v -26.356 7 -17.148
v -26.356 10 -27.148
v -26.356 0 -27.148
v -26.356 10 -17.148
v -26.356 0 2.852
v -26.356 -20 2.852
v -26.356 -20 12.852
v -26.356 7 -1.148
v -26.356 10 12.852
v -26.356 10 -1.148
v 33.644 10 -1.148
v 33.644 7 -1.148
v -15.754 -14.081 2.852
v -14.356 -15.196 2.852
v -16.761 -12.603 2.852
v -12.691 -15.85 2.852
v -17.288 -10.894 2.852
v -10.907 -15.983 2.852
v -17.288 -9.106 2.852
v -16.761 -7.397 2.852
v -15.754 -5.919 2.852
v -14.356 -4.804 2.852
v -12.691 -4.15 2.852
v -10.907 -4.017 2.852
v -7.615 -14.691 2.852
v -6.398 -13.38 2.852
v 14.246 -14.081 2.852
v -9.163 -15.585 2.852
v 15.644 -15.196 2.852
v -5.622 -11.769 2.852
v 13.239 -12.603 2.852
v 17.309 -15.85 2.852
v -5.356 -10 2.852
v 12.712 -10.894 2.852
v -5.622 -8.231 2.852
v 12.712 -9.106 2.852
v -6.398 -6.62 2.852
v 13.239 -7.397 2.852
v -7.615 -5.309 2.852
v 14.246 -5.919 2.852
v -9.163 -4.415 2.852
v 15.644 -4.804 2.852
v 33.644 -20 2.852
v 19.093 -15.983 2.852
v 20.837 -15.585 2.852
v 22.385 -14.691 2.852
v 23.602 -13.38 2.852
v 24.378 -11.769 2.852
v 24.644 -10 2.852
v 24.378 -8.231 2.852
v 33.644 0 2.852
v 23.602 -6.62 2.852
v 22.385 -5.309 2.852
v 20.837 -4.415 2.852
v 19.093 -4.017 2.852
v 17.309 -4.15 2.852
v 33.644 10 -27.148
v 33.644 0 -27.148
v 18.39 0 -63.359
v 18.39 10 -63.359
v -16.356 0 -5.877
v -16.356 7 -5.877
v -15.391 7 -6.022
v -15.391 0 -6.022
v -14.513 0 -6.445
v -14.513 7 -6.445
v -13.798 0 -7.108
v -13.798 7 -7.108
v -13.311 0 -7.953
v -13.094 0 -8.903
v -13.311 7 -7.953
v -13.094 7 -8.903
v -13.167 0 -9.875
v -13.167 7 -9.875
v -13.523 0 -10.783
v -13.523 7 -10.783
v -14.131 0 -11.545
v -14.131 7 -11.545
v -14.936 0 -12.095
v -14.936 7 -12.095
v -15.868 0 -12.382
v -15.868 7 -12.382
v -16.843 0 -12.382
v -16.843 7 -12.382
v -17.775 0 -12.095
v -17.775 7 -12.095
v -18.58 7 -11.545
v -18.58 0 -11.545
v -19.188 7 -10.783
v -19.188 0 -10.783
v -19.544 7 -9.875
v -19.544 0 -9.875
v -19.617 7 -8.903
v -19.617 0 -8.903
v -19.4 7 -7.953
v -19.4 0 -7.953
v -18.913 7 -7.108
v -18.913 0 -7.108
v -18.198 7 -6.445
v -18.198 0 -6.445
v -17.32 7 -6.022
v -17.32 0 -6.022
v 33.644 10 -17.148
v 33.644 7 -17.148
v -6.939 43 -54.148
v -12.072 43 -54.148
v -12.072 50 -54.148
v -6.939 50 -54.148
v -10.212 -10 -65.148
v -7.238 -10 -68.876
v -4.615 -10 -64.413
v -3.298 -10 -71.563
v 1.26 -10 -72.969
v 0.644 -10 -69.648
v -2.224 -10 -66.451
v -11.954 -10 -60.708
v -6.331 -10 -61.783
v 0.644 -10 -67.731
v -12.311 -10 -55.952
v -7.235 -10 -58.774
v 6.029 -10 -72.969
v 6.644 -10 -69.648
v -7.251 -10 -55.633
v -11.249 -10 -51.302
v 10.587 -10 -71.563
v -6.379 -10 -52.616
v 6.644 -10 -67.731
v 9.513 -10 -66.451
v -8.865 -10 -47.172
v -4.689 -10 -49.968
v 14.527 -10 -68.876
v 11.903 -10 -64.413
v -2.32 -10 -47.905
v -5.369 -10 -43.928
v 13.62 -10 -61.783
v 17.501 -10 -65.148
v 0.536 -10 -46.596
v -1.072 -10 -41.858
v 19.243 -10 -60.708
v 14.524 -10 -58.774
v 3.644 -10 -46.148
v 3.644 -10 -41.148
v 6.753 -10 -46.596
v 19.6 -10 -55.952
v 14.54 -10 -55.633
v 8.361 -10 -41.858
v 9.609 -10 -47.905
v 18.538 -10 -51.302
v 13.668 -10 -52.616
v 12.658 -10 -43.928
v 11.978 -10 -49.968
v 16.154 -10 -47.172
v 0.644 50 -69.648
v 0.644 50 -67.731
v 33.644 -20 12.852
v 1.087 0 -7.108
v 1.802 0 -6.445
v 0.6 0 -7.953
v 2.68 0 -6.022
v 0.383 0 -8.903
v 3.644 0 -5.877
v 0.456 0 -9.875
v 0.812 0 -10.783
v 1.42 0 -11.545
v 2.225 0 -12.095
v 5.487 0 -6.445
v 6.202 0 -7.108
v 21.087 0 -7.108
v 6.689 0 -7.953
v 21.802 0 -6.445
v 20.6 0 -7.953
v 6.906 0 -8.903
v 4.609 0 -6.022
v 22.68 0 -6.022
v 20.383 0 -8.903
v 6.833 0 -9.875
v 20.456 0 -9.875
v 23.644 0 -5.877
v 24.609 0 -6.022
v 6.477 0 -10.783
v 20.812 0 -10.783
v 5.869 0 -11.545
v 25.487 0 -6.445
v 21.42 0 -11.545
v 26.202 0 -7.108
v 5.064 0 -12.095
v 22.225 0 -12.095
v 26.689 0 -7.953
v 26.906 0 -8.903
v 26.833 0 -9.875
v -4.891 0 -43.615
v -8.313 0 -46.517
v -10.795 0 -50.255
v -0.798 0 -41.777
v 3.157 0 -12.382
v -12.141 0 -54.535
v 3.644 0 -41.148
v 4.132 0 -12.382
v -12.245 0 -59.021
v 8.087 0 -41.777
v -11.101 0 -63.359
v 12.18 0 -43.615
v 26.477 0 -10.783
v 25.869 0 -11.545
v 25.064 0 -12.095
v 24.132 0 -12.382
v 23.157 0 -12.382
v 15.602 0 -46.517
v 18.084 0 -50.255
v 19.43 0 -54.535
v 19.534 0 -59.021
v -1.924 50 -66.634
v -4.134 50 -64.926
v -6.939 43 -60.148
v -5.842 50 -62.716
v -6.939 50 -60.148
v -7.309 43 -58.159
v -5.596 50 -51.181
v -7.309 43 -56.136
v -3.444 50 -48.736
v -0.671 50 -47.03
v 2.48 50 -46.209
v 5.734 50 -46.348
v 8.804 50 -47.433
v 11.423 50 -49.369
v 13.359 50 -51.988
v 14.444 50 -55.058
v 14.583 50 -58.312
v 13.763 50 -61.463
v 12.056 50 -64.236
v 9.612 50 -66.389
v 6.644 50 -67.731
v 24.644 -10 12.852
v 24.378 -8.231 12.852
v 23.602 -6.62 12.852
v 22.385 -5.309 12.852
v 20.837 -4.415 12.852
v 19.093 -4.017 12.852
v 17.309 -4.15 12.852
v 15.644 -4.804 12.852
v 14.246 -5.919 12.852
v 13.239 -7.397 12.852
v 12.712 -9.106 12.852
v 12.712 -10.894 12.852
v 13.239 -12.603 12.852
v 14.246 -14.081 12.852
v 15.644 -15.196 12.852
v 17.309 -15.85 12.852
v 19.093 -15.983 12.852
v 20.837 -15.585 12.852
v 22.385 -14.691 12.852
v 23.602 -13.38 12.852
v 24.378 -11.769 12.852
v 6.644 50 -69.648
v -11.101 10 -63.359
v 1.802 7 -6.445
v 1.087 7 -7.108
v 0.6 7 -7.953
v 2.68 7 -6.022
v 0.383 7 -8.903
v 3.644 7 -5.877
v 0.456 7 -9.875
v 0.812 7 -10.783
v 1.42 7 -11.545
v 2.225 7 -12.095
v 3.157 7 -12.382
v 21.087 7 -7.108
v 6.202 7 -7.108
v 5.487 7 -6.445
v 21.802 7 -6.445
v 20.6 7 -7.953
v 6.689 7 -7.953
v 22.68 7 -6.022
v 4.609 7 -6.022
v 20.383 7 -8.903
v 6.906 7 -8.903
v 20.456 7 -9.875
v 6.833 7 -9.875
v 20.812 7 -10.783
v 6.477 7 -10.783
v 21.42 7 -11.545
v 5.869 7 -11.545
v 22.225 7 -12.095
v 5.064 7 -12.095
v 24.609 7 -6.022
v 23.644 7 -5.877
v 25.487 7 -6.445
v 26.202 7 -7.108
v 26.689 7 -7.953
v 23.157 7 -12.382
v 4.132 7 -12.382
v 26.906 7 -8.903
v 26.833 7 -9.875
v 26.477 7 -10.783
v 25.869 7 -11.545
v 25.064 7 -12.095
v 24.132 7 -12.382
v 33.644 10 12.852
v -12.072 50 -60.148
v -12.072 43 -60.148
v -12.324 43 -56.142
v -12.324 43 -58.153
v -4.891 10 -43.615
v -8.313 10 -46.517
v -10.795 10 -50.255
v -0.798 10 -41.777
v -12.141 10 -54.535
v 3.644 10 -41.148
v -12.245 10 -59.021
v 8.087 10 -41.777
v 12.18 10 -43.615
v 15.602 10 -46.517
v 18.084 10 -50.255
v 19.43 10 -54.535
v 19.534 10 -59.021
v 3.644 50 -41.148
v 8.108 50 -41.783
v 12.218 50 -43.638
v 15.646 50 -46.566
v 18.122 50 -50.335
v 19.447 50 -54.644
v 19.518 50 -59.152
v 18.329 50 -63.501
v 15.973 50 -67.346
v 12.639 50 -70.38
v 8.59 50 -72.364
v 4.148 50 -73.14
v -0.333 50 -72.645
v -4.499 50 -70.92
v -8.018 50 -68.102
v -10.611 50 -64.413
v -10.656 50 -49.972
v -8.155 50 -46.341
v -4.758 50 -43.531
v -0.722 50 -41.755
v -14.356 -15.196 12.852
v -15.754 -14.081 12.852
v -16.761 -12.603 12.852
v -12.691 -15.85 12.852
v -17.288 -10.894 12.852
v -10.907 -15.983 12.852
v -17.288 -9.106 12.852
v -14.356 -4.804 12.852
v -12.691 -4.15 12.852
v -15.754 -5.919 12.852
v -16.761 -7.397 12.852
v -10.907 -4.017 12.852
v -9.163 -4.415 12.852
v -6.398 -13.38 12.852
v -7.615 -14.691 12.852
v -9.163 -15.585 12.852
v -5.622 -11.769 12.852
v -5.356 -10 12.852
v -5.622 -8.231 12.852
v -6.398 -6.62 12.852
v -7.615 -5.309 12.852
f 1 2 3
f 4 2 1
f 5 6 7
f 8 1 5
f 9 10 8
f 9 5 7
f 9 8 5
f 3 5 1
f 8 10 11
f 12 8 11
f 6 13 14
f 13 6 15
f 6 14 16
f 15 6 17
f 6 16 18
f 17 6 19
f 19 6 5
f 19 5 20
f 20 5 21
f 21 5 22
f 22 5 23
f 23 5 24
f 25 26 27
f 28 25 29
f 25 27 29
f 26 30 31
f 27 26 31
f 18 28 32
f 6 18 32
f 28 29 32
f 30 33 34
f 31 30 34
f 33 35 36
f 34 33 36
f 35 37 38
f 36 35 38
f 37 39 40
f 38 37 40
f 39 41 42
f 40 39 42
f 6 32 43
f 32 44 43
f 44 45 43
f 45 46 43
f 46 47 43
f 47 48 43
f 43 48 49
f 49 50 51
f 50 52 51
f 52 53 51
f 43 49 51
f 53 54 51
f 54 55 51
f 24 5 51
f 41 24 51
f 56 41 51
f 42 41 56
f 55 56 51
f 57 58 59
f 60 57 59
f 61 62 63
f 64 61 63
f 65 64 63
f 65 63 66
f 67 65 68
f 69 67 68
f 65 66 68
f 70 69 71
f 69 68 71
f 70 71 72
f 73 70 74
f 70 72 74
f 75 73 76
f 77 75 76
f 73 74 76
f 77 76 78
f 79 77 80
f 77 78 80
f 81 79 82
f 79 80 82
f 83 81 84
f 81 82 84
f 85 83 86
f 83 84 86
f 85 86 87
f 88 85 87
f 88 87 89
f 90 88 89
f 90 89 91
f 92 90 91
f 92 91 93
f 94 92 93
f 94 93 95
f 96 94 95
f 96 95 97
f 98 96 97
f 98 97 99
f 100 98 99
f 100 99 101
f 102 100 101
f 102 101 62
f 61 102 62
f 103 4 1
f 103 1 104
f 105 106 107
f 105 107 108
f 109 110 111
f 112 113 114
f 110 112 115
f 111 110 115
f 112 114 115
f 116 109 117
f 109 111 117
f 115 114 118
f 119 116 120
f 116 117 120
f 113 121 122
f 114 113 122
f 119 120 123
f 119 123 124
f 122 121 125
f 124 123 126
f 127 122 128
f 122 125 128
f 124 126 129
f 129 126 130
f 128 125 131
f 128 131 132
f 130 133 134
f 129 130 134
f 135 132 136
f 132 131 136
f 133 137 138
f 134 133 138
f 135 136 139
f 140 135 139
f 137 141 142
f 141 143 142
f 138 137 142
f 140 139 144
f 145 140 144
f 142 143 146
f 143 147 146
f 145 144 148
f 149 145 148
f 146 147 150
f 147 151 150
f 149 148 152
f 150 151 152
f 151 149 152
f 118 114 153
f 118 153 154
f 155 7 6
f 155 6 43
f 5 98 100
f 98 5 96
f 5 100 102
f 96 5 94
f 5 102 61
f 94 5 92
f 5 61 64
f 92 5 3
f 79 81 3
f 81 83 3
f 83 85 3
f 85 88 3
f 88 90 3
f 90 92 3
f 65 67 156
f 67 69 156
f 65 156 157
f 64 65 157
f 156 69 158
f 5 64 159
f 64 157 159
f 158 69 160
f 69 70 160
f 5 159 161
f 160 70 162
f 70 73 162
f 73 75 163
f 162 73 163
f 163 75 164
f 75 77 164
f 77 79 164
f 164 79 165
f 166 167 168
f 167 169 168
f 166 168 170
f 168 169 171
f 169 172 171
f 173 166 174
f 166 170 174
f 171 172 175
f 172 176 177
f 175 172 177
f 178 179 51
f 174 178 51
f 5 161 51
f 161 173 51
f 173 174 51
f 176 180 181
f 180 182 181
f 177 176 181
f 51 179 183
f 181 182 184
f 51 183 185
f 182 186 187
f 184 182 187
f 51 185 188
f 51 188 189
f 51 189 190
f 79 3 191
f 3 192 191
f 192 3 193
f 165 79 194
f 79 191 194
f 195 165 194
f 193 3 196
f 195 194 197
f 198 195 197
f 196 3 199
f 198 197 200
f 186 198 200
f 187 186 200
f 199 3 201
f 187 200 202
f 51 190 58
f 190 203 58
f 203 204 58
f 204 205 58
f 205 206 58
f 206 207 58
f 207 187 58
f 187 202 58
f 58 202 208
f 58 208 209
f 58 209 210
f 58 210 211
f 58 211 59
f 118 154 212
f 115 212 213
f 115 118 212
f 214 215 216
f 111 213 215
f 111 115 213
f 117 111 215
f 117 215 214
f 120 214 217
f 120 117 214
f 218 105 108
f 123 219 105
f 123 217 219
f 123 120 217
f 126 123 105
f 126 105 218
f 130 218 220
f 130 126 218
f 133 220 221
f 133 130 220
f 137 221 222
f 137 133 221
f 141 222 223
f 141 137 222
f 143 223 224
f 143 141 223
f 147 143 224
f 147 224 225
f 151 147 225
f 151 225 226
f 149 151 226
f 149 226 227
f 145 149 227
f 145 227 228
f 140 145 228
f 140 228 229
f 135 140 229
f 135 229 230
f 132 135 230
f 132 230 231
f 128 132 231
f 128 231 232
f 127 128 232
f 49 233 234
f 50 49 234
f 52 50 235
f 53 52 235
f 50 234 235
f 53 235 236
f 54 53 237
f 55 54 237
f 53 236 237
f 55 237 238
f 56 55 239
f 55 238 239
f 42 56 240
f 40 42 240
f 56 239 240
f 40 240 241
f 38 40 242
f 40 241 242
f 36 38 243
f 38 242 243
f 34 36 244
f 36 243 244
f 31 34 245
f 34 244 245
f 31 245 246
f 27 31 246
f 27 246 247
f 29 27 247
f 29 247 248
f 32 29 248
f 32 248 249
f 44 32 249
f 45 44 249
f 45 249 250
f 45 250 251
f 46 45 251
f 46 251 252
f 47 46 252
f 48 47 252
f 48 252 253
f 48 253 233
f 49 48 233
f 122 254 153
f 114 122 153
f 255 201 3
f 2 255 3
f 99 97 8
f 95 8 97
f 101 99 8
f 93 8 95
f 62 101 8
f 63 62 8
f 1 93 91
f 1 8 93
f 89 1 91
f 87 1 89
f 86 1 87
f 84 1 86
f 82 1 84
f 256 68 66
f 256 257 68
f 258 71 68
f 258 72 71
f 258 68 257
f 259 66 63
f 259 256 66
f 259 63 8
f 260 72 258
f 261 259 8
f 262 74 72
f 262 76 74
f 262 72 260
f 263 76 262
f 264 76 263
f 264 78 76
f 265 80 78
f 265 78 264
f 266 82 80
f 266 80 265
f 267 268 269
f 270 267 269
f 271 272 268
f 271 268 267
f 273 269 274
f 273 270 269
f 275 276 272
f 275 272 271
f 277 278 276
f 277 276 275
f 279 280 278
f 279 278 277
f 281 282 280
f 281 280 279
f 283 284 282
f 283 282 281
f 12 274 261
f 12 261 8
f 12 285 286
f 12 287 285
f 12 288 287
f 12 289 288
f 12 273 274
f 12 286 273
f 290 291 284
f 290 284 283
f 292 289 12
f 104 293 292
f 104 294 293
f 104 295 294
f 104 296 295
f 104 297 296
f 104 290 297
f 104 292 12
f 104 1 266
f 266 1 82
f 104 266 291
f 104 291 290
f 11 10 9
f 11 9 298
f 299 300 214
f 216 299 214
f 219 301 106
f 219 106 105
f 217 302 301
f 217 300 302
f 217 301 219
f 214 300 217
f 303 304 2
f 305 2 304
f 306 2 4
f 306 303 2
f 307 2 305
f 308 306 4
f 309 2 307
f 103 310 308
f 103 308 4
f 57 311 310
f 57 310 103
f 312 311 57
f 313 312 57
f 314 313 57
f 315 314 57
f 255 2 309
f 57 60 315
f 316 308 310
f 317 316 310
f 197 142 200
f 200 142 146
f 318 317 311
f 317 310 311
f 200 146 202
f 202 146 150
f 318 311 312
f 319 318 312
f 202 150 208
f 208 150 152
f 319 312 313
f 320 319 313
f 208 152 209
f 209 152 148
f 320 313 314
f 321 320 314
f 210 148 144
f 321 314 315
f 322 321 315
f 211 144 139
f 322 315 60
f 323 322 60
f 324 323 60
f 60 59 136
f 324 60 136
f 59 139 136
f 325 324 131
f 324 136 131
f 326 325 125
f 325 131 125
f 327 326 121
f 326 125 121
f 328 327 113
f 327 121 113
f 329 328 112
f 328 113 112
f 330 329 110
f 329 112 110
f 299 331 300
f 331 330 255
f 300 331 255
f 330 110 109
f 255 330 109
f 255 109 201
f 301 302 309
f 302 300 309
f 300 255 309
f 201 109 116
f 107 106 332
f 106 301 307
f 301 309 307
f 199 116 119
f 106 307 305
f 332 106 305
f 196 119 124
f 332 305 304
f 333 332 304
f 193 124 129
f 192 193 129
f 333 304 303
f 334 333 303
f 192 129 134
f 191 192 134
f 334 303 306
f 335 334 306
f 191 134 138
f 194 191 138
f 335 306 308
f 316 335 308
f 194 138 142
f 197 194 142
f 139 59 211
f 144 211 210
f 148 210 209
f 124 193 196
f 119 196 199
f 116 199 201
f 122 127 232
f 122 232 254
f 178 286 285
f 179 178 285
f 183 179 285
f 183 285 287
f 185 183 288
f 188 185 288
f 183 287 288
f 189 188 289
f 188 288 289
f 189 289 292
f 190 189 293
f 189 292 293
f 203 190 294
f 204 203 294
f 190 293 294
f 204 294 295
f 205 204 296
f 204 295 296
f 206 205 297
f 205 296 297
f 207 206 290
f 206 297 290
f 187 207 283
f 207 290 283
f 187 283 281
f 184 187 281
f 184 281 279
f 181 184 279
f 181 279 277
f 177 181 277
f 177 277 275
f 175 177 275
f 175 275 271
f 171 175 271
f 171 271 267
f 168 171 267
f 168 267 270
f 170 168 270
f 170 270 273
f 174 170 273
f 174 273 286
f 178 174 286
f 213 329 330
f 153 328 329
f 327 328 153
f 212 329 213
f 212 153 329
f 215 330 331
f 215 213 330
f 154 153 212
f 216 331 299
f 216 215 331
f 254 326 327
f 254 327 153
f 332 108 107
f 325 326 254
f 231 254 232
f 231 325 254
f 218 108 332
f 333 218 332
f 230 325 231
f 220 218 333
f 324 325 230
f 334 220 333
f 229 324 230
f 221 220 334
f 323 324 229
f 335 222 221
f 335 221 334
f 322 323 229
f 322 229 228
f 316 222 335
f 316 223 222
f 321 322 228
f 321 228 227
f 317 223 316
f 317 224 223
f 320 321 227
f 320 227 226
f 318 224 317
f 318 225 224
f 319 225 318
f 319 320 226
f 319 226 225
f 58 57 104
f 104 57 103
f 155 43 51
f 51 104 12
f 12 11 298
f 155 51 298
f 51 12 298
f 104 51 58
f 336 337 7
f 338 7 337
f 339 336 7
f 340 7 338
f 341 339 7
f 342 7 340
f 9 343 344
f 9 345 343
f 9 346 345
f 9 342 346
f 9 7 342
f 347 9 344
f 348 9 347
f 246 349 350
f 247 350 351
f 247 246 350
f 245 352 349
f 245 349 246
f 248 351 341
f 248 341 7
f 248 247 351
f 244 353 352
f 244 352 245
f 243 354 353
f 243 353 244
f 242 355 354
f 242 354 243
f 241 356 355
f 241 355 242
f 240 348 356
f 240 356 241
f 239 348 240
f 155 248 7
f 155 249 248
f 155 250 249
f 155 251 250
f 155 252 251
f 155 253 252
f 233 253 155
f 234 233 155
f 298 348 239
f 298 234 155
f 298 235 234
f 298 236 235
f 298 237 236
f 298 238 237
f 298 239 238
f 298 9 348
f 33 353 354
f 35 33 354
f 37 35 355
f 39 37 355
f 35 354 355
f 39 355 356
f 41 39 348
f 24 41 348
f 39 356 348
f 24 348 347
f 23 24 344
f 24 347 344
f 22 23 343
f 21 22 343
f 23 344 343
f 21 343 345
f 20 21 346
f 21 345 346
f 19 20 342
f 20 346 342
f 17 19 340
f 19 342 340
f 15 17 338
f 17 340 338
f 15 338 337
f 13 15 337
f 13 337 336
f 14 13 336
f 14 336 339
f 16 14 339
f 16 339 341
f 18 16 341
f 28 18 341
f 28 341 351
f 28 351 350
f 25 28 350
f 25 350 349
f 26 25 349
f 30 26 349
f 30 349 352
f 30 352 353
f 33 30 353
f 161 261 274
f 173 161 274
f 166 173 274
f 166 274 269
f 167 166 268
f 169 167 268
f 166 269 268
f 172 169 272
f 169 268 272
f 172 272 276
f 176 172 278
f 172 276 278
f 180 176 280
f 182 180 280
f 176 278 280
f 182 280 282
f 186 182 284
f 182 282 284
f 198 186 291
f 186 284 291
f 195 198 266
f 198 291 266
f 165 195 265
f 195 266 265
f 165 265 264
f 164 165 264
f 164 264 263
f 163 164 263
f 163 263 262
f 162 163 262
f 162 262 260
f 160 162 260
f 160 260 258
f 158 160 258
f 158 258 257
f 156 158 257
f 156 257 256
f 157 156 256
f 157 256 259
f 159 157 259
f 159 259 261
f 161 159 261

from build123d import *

# Parameters (mm, degrees)
BOSS_EXTRUDE1_DEPTH      = 10
SKETCH3_W                = 60
SKETCH3_H                = 10
BOSS_EXTRUDE2_DEPTH      = 20
SKETCH4_R                = 6
CUT_EXTRUDE1_DEPTH       = 20
SKETCH5_W                = 60
SKETCH5_H                = 16
CUT_EXTRUDE2_DEPTH       = 3
SKETCH6_R                = 3.270829893
CUT_EXTRUDE3_DEPTH       = 20
BOSS_EXTRUDE4_DEPTH      = 40
BOSS_EXTRUDE4_DEPTH_BACK = 20
SKETCH7_R                = 16
SKETCH10_W               = 12.846934043
SKETCH10_H               = 6
CUT_EXTRUDE4_DEPTH       = 7


with BuildPart() as part:
    # Sketch2 → Boss-Extrude1 (new body)
    with BuildSketch(Plane(origin=(0, 0, 0), x_dir=(1, 0, 0), z_dir=(0, 1, 0))):
        with BuildLine():
            Line((-26.355501721, -12.852372891), (33.644498279, -12.852372891))
            Line((33.644498279, -12.852372891), (33.644498279, 27.147627109))
            Line((33.644498279, 27.147627109), (18.389502388, 63.359297885))
            ThreePointArc((18.389502388, 63.359297885), (3.644498279, 73.147627109), (-11.10050583, 63.359297885))
            Line((-11.10050583, 63.359297885), (-26.355501721, 27.147627109))
            Line((-26.355501721, 27.147627109), (-26.355501721, -12.852372891))
        make_face()
        with BuildLine():
            Line((0.644498279, 69.647627109), (6.644498279, 69.647627109))
            Line((6.644498279, 69.647627109), (6.644498279, 67.730632354))
            ThreePointArc((6.644498279, 67.730632354), (3.644498279, 46.147627109), (0.644498279, 67.730632354))
            Line((0.644498279, 67.730632354), (0.644498279, 69.647627109))
        make_face(mode=Mode.SUBTRACT)
    extrude(amount=BOSS_EXTRUDE1_DEPTH)

    # Sketch3 → Boss-Extrude2 (add)
    with BuildSketch(Plane.XZ):
        with Locations((3.644498279, 7.852372891)):
            Rectangle(SKETCH3_W, SKETCH3_H)
    extrude(amount=BOSS_EXTRUDE2_DEPTH)

    # Sketch4 → Cut-Extrude1 (cut)
    with BuildSketch(Plane.XY.offset(12.852372891)):
        with Locations((-11.355501721, -10)):
            Circle(SKETCH4_R)
        with Locations((18.644498279, -10)):
            Circle(SKETCH4_R)
    extrude(amount=-CUT_EXTRUDE1_DEPTH, mode=Mode.SUBTRACT)

    # Sketch5 → Cut-Extrude2 (cut)
    with BuildSketch(Plane(origin=(0, 10, 0), x_dir=(1, 0, 0), z_dir=(0, 1, 0))):
        with Locations((3.644498279, 9.147627109)):
            Rectangle(SKETCH5_W, SKETCH5_H)
    extrude(amount=-CUT_EXTRUDE2_DEPTH, mode=Mode.SUBTRACT)

    # Sketch6 → Cut-Extrude3 (cut)
    with BuildSketch(Plane(origin=(0, 7, 0), x_dir=(1, 0, 0), z_dir=(0, 1, 0))):
        with Locations(Location((-16.355501721, 9.147627109, 0), (0, 0, 270))):
            Circle(SKETCH6_R)
        with Locations(Location((3.644498279, 9.147627109, 0), (0, 0, 270))):
            Circle(SKETCH6_R)
        with Locations(Location((23.644498279, 9.147627109, 0), (0, 0, 270))):
            Circle(SKETCH6_R)
    extrude(amount=-CUT_EXTRUDE3_DEPTH, mode=Mode.SUBTRACT)

    # Sketch7 → Boss-Extrude4 (add, two sides: drawn at the far end of the back side and taken through both)
    with BuildSketch(Plane(origin=(0, 10, 0), x_dir=(1, 0, 0), z_dir=(0, 1, 0)).offset(-BOSS_EXTRUDE4_DEPTH_BACK)):
        with Locations(Location((3.644498279, 57.147627109, 0), (0, 0, 270))):
            Circle(SKETCH7_R)
        with BuildLine():
            Line((6.644498279, 67.730632354), (6.644498279, 69.647627109))
            Line((6.644498279, 69.647627109), (0.644498279, 69.647627109))
            Line((0.644498279, 69.647627109), (0.644498279, 67.730632354))
            ThreePointArc((0.644498279, 67.730632354), (3.644498279, 46.147627109), (6.644498279, 67.730632354))
        make_face(mode=Mode.SUBTRACT)
    extrude(amount=BOSS_EXTRUDE4_DEPTH + BOSS_EXTRUDE4_DEPTH_BACK)

    # Sketch10 → Cut-Extrude4 (cut)
    with BuildSketch(Plane(origin=(0, 50, 0), x_dir=(1, 0, 0), z_dir=(0, 1, 0))):
        with Locations((-7.355501722, 57.147627109)):
            Rectangle(SKETCH10_W, SKETCH10_H)
    extrude(amount=-CUT_EXTRUDE4_DEPTH, mode=Mode.SUBTRACT)


solid = part.part
